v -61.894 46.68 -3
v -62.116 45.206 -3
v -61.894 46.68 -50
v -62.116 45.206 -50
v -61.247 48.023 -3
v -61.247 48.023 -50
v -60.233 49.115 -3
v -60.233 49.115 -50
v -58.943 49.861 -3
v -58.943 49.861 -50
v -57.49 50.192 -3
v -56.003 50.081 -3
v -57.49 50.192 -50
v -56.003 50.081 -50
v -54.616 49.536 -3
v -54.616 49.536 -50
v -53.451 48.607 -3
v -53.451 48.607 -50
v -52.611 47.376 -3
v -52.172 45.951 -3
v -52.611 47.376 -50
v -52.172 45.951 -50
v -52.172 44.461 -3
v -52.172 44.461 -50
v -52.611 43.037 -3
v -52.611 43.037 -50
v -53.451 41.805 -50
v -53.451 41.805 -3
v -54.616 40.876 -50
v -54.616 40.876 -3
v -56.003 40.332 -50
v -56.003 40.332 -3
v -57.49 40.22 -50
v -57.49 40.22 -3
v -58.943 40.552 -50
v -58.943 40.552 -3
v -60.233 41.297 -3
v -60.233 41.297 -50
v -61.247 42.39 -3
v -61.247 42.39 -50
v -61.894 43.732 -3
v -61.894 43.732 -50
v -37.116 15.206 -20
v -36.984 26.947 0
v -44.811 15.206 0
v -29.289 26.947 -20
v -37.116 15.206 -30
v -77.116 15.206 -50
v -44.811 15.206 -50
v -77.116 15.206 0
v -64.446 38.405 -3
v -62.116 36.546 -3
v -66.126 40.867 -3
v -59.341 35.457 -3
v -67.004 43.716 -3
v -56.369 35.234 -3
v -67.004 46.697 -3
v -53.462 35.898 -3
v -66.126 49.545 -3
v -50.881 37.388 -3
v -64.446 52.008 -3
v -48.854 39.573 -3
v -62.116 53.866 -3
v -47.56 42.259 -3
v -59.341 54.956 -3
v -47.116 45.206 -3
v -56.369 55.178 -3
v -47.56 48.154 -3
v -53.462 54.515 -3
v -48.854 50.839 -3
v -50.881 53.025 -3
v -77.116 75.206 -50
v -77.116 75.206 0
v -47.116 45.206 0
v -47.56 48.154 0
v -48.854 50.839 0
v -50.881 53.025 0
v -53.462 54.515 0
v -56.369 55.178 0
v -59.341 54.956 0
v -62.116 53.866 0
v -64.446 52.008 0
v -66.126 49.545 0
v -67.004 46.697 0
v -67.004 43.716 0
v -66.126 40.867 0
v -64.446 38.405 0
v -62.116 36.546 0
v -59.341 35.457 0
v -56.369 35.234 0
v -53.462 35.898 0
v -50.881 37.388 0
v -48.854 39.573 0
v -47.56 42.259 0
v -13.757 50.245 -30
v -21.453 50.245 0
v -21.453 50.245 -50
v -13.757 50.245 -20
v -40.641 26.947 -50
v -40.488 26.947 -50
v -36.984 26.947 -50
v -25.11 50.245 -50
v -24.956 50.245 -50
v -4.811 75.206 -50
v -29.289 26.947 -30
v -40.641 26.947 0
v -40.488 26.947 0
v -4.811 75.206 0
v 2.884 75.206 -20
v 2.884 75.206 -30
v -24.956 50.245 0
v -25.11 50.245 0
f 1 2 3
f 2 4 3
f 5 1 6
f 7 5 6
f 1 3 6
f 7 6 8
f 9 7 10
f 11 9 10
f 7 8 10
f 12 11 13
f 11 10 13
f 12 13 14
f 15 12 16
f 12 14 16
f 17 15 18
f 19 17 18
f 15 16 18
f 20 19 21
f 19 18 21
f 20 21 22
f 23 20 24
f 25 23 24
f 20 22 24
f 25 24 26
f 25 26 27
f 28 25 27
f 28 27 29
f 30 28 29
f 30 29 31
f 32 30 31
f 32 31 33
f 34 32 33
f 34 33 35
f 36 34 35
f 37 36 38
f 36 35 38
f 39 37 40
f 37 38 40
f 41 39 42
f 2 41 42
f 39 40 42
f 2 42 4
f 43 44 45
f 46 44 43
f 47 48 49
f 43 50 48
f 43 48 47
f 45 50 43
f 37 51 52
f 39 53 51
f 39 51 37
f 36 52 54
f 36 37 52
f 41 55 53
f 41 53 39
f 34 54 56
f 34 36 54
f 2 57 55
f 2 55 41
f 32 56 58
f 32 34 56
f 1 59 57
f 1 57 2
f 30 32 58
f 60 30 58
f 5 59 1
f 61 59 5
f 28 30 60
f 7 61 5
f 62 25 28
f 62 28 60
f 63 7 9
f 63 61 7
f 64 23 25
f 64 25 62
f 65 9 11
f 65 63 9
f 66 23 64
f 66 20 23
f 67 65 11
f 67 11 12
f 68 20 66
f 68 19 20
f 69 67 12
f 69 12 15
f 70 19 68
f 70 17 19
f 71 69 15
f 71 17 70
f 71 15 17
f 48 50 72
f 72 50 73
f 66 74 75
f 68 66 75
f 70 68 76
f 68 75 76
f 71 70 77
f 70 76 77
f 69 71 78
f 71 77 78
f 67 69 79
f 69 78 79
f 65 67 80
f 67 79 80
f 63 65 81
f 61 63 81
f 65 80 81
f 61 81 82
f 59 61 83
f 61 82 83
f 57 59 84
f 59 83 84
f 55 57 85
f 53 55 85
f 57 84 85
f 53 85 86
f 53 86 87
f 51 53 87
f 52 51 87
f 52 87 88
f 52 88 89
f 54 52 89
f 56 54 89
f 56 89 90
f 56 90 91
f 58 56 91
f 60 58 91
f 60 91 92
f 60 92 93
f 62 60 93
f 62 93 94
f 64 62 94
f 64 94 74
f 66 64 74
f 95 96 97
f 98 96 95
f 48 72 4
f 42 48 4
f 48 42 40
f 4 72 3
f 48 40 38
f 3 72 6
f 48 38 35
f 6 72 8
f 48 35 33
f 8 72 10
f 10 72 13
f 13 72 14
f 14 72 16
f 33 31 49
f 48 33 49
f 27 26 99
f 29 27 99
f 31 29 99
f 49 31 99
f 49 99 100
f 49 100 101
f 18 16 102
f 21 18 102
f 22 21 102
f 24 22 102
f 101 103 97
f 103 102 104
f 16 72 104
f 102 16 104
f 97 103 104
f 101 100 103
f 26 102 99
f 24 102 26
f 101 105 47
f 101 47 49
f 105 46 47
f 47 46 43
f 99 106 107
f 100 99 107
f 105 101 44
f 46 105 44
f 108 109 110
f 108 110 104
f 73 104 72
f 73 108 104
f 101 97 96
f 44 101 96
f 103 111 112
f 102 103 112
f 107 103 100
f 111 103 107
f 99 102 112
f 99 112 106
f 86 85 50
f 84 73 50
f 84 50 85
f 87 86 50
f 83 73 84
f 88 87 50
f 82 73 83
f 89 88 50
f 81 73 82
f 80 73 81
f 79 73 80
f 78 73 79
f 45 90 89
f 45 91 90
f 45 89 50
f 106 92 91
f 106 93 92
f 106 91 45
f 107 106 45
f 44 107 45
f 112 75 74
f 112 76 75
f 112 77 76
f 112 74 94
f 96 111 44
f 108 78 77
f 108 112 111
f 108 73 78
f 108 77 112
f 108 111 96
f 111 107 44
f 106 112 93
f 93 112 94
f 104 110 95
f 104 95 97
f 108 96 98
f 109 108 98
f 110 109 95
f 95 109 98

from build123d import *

# Parameters (mm, degrees)
BOSS_EXTRUDE4_DEPTH                                 = 50
CBORE_FOR_00_BINDING_HEAD_MACHINE_SCREW_D           = 10.000000066
CBORE_FOR_00_BINDING_HEAD_MACHINE_SCREW_CBORE_D     = 19.999999878
CBORE_FOR_00_BINDING_HEAD_MACHINE_SCREW_CBORE_DEPTH = 3.000000096
BOSS_EXTRUDE5_REACH                                 = 119.883
SKETCH13_W                                          = 50
SKETCH13_H                                          = 2.915477917
BOSS_EXTRUDE5_DIRECTION_2_REACH                     = 119.883
CUT_EXTRUDE4_REACH                                  = 119.883
CUT_EXTRUDE4_DIRECTION_2_REACH                      = 119.883


with BuildPart() as part:
    # Sketch1 → Boss-Extrude4 (new body)
    with BuildSketch(Plane.XY):
        Polygon((-37.115898542, 15.206245128), (-57.115898542, 15.206245128), (-17.115898542, 75.206245128), (2.884101458, 75.206245128), (-13.756904429, 50.244736298), (-25.109531796, 50.244736298), (-40.64113729, 26.947328056), (-29.288509924, 26.947328056), align=None)
        Polygon((-77.115898542, 15.206245128), (-77.115898542, 75.206245128), (-17.115898542, 75.206245128), (-57.115898542, 15.206245128), align=None)
    extrude(amount=-BOSS_EXTRUDE4_DEPTH)

    # CBORE for #00 Binding Head Machine Screw2 (through all)
    with Locations(Plane.XY):
        with Locations((-57.115898542, 45.206245128)):
            CounterBoreHole(CBORE_FOR_00_BINDING_HEAD_MACHINE_SCREW_D / 2, CBORE_FOR_00_BINDING_HEAD_MACHINE_SCREW_CBORE_D / 2, CBORE_FOR_00_BINDING_HEAD_MACHINE_SCREW_CBORE_DEPTH)

    # Boss-Extrude5: up to this plane
    boss_extrude5_end = Plane(origin=(0, 50.244736298, -50), z_dir=(0, 1, 0))
    # Sketch13 → Boss-Extrude5 (add, up to the surface)
    with BuildSketch(Plane(origin=(3.425379126, 5.13806869, 0), x_dir=(0, 0, 1), z_dir=(0.5547001962252258, 0.8320502943378458, 0)), mode=Mode.PRIVATE) as boss_extrude5_sk1:
        with Locations((-25, -47.17806466)):
            Rectangle(SKETCH13_W, SKETCH13_H)
    boss_extrude5_tool1 = split(extrude(boss_extrude5_sk1.sketch, amount=BOSS_EXTRUDE5_REACH, mode=Mode.PRIVATE), bisect_by=boss_extrude5_end, keep=Keep.BOTH, mode=Mode.PRIVATE)
    add(boss_extrude5_tool1.solids().sort_by_distance((-35.829143, 31.30775, -25))[0])

    # Boss-Extrude5 direction 2: up to this plane
    boss_extrude5_direction_2_end = Plane(origin=(0, 26.947328056, -50), z_dir=(0, -1, 0))
    # Sketch13 → Boss-Extrude5 direction 2 (add, up to the surface)
    with BuildSketch(Plane(origin=(3.425379126, 5.13806869, 0), x_dir=(0, 0, 1), z_dir=(0.5547001962252258, 0.8320502943378458, 0)), mode=Mode.PRIVATE) as boss_extrude5_direction_2_sk1:
        with Locations((-25, -47.17806466)):
            Rectangle(SKETCH13_W, SKETCH13_H)
    boss_extrude5_direction_2_tool1 = split(extrude(boss_extrude5_direction_2_sk1.sketch, amount=-BOSS_EXTRUDE5_DIRECTION_2_REACH, mode=Mode.PRIVATE), bisect_by=boss_extrude5_direction_2_end, keep=Keep.BOTH, mode=Mode.PRIVATE)
    add(boss_extrude5_direction_2_tool1.solids().sort_by_distance((-35.829143, 31.30775, -25))[0])

    # Sketch13<5> → Cut-Extrude4 (cut, up to next)
    with BuildSketch(Plane(origin=(3.425379126, 5.13806869, 0), x_dir=(0, 0, 1), z_dir=(0.5547001962252258, 0.8320502943378458, 0)), mode=Mode.PRIVATE) as cut_extrude4_sk1:
        Polygon((-50, -39.317201463), (-30, -39.317201463), (-50, -45.720325701), align=None)
    cut_extrude4_tool1 = extrude(cut_extrude4_sk1.sketch, amount=-CUT_EXTRUDE4_REACH, mode=Mode.PRIVATE) & part.part
    # Sketch13<5> → Cut-Extrude4 (cut, up to next)
    with BuildSketch(Plane(origin=(3.425379126, 5.13806869, 0), x_dir=(0, 0, 1), z_dir=(0.5547001962252258, 0.8320502943378458, 0)), mode=Mode.PRIVATE) as cut_extrude4_sk2:
        Polygon((0, -39.317201463), (0, -45.720325701), (-20, -39.317201463), align=None)
    cut_extrude4_tool2 = extrude(cut_extrude4_sk2.sketch, amount=-CUT_EXTRUDE4_REACH, mode=Mode.PRIVATE) & part.part
    add(cut_extrude4_tool1.solids().sort_by_distance((-31.064417, 28.131266, -43.333333))[0], mode=Mode.SUBTRACT)
    add(cut_extrude4_tool2.solids().sort_by_distance((-31.064417, 28.131266, -6.666667))[0], mode=Mode.SUBTRACT)

    # Sketch13<5> → Cut-Extrude4 direction 2 (cut, up to next)
    with BuildSketch(Plane(origin=(3.425379126, 5.13806869, 0), x_dir=(0, 0, 1), z_dir=(0.5547001962252258, 0.8320502943378458, 0)), mode=Mode.PRIVATE) as cut_extrude4_direction_2_sk1:
        Polygon((-50, -39.317201463), (-30, -39.317201463), (-50, -45.720325701), align=None)
    cut_extrude4_direction_2_tool1 = extrude(cut_extrude4_direction_2_sk1.sketch, amount=CUT_EXTRUDE4_DIRECTION_2_REACH, mode=Mode.PRIVATE) & part.part
    # Sketch13<5> → Cut-Extrude4 direction 2 (cut, up to next)
    with BuildSketch(Plane(origin=(3.425379126, 5.13806869, 0), x_dir=(0, 0, 1), z_dir=(0.5547001962252258, 0.8320502943378458, 0)), mode=Mode.PRIVATE) as cut_extrude4_direction_2_sk2:
        Polygon((0, -39.317201463), (0, -45.720325701), (-20, -39.317201463), align=None)
    cut_extrude4_direction_2_tool2 = extrude(cut_extrude4_direction_2_sk2.sketch, amount=CUT_EXTRUDE4_DIRECTION_2_REACH, mode=Mode.PRIVATE) & part.part
    add(cut_extrude4_direction_2_tool1.solids().sort_by_distance((-31.064417, 28.131266, -43.333333))[0], mode=Mode.SUBTRACT)
    add(cut_extrude4_direction_2_tool2.solids().sort_by_distance((-31.064417, 28.131266, -6.666667))[0], mode=Mode.SUBTRACT)


solid = part.part
